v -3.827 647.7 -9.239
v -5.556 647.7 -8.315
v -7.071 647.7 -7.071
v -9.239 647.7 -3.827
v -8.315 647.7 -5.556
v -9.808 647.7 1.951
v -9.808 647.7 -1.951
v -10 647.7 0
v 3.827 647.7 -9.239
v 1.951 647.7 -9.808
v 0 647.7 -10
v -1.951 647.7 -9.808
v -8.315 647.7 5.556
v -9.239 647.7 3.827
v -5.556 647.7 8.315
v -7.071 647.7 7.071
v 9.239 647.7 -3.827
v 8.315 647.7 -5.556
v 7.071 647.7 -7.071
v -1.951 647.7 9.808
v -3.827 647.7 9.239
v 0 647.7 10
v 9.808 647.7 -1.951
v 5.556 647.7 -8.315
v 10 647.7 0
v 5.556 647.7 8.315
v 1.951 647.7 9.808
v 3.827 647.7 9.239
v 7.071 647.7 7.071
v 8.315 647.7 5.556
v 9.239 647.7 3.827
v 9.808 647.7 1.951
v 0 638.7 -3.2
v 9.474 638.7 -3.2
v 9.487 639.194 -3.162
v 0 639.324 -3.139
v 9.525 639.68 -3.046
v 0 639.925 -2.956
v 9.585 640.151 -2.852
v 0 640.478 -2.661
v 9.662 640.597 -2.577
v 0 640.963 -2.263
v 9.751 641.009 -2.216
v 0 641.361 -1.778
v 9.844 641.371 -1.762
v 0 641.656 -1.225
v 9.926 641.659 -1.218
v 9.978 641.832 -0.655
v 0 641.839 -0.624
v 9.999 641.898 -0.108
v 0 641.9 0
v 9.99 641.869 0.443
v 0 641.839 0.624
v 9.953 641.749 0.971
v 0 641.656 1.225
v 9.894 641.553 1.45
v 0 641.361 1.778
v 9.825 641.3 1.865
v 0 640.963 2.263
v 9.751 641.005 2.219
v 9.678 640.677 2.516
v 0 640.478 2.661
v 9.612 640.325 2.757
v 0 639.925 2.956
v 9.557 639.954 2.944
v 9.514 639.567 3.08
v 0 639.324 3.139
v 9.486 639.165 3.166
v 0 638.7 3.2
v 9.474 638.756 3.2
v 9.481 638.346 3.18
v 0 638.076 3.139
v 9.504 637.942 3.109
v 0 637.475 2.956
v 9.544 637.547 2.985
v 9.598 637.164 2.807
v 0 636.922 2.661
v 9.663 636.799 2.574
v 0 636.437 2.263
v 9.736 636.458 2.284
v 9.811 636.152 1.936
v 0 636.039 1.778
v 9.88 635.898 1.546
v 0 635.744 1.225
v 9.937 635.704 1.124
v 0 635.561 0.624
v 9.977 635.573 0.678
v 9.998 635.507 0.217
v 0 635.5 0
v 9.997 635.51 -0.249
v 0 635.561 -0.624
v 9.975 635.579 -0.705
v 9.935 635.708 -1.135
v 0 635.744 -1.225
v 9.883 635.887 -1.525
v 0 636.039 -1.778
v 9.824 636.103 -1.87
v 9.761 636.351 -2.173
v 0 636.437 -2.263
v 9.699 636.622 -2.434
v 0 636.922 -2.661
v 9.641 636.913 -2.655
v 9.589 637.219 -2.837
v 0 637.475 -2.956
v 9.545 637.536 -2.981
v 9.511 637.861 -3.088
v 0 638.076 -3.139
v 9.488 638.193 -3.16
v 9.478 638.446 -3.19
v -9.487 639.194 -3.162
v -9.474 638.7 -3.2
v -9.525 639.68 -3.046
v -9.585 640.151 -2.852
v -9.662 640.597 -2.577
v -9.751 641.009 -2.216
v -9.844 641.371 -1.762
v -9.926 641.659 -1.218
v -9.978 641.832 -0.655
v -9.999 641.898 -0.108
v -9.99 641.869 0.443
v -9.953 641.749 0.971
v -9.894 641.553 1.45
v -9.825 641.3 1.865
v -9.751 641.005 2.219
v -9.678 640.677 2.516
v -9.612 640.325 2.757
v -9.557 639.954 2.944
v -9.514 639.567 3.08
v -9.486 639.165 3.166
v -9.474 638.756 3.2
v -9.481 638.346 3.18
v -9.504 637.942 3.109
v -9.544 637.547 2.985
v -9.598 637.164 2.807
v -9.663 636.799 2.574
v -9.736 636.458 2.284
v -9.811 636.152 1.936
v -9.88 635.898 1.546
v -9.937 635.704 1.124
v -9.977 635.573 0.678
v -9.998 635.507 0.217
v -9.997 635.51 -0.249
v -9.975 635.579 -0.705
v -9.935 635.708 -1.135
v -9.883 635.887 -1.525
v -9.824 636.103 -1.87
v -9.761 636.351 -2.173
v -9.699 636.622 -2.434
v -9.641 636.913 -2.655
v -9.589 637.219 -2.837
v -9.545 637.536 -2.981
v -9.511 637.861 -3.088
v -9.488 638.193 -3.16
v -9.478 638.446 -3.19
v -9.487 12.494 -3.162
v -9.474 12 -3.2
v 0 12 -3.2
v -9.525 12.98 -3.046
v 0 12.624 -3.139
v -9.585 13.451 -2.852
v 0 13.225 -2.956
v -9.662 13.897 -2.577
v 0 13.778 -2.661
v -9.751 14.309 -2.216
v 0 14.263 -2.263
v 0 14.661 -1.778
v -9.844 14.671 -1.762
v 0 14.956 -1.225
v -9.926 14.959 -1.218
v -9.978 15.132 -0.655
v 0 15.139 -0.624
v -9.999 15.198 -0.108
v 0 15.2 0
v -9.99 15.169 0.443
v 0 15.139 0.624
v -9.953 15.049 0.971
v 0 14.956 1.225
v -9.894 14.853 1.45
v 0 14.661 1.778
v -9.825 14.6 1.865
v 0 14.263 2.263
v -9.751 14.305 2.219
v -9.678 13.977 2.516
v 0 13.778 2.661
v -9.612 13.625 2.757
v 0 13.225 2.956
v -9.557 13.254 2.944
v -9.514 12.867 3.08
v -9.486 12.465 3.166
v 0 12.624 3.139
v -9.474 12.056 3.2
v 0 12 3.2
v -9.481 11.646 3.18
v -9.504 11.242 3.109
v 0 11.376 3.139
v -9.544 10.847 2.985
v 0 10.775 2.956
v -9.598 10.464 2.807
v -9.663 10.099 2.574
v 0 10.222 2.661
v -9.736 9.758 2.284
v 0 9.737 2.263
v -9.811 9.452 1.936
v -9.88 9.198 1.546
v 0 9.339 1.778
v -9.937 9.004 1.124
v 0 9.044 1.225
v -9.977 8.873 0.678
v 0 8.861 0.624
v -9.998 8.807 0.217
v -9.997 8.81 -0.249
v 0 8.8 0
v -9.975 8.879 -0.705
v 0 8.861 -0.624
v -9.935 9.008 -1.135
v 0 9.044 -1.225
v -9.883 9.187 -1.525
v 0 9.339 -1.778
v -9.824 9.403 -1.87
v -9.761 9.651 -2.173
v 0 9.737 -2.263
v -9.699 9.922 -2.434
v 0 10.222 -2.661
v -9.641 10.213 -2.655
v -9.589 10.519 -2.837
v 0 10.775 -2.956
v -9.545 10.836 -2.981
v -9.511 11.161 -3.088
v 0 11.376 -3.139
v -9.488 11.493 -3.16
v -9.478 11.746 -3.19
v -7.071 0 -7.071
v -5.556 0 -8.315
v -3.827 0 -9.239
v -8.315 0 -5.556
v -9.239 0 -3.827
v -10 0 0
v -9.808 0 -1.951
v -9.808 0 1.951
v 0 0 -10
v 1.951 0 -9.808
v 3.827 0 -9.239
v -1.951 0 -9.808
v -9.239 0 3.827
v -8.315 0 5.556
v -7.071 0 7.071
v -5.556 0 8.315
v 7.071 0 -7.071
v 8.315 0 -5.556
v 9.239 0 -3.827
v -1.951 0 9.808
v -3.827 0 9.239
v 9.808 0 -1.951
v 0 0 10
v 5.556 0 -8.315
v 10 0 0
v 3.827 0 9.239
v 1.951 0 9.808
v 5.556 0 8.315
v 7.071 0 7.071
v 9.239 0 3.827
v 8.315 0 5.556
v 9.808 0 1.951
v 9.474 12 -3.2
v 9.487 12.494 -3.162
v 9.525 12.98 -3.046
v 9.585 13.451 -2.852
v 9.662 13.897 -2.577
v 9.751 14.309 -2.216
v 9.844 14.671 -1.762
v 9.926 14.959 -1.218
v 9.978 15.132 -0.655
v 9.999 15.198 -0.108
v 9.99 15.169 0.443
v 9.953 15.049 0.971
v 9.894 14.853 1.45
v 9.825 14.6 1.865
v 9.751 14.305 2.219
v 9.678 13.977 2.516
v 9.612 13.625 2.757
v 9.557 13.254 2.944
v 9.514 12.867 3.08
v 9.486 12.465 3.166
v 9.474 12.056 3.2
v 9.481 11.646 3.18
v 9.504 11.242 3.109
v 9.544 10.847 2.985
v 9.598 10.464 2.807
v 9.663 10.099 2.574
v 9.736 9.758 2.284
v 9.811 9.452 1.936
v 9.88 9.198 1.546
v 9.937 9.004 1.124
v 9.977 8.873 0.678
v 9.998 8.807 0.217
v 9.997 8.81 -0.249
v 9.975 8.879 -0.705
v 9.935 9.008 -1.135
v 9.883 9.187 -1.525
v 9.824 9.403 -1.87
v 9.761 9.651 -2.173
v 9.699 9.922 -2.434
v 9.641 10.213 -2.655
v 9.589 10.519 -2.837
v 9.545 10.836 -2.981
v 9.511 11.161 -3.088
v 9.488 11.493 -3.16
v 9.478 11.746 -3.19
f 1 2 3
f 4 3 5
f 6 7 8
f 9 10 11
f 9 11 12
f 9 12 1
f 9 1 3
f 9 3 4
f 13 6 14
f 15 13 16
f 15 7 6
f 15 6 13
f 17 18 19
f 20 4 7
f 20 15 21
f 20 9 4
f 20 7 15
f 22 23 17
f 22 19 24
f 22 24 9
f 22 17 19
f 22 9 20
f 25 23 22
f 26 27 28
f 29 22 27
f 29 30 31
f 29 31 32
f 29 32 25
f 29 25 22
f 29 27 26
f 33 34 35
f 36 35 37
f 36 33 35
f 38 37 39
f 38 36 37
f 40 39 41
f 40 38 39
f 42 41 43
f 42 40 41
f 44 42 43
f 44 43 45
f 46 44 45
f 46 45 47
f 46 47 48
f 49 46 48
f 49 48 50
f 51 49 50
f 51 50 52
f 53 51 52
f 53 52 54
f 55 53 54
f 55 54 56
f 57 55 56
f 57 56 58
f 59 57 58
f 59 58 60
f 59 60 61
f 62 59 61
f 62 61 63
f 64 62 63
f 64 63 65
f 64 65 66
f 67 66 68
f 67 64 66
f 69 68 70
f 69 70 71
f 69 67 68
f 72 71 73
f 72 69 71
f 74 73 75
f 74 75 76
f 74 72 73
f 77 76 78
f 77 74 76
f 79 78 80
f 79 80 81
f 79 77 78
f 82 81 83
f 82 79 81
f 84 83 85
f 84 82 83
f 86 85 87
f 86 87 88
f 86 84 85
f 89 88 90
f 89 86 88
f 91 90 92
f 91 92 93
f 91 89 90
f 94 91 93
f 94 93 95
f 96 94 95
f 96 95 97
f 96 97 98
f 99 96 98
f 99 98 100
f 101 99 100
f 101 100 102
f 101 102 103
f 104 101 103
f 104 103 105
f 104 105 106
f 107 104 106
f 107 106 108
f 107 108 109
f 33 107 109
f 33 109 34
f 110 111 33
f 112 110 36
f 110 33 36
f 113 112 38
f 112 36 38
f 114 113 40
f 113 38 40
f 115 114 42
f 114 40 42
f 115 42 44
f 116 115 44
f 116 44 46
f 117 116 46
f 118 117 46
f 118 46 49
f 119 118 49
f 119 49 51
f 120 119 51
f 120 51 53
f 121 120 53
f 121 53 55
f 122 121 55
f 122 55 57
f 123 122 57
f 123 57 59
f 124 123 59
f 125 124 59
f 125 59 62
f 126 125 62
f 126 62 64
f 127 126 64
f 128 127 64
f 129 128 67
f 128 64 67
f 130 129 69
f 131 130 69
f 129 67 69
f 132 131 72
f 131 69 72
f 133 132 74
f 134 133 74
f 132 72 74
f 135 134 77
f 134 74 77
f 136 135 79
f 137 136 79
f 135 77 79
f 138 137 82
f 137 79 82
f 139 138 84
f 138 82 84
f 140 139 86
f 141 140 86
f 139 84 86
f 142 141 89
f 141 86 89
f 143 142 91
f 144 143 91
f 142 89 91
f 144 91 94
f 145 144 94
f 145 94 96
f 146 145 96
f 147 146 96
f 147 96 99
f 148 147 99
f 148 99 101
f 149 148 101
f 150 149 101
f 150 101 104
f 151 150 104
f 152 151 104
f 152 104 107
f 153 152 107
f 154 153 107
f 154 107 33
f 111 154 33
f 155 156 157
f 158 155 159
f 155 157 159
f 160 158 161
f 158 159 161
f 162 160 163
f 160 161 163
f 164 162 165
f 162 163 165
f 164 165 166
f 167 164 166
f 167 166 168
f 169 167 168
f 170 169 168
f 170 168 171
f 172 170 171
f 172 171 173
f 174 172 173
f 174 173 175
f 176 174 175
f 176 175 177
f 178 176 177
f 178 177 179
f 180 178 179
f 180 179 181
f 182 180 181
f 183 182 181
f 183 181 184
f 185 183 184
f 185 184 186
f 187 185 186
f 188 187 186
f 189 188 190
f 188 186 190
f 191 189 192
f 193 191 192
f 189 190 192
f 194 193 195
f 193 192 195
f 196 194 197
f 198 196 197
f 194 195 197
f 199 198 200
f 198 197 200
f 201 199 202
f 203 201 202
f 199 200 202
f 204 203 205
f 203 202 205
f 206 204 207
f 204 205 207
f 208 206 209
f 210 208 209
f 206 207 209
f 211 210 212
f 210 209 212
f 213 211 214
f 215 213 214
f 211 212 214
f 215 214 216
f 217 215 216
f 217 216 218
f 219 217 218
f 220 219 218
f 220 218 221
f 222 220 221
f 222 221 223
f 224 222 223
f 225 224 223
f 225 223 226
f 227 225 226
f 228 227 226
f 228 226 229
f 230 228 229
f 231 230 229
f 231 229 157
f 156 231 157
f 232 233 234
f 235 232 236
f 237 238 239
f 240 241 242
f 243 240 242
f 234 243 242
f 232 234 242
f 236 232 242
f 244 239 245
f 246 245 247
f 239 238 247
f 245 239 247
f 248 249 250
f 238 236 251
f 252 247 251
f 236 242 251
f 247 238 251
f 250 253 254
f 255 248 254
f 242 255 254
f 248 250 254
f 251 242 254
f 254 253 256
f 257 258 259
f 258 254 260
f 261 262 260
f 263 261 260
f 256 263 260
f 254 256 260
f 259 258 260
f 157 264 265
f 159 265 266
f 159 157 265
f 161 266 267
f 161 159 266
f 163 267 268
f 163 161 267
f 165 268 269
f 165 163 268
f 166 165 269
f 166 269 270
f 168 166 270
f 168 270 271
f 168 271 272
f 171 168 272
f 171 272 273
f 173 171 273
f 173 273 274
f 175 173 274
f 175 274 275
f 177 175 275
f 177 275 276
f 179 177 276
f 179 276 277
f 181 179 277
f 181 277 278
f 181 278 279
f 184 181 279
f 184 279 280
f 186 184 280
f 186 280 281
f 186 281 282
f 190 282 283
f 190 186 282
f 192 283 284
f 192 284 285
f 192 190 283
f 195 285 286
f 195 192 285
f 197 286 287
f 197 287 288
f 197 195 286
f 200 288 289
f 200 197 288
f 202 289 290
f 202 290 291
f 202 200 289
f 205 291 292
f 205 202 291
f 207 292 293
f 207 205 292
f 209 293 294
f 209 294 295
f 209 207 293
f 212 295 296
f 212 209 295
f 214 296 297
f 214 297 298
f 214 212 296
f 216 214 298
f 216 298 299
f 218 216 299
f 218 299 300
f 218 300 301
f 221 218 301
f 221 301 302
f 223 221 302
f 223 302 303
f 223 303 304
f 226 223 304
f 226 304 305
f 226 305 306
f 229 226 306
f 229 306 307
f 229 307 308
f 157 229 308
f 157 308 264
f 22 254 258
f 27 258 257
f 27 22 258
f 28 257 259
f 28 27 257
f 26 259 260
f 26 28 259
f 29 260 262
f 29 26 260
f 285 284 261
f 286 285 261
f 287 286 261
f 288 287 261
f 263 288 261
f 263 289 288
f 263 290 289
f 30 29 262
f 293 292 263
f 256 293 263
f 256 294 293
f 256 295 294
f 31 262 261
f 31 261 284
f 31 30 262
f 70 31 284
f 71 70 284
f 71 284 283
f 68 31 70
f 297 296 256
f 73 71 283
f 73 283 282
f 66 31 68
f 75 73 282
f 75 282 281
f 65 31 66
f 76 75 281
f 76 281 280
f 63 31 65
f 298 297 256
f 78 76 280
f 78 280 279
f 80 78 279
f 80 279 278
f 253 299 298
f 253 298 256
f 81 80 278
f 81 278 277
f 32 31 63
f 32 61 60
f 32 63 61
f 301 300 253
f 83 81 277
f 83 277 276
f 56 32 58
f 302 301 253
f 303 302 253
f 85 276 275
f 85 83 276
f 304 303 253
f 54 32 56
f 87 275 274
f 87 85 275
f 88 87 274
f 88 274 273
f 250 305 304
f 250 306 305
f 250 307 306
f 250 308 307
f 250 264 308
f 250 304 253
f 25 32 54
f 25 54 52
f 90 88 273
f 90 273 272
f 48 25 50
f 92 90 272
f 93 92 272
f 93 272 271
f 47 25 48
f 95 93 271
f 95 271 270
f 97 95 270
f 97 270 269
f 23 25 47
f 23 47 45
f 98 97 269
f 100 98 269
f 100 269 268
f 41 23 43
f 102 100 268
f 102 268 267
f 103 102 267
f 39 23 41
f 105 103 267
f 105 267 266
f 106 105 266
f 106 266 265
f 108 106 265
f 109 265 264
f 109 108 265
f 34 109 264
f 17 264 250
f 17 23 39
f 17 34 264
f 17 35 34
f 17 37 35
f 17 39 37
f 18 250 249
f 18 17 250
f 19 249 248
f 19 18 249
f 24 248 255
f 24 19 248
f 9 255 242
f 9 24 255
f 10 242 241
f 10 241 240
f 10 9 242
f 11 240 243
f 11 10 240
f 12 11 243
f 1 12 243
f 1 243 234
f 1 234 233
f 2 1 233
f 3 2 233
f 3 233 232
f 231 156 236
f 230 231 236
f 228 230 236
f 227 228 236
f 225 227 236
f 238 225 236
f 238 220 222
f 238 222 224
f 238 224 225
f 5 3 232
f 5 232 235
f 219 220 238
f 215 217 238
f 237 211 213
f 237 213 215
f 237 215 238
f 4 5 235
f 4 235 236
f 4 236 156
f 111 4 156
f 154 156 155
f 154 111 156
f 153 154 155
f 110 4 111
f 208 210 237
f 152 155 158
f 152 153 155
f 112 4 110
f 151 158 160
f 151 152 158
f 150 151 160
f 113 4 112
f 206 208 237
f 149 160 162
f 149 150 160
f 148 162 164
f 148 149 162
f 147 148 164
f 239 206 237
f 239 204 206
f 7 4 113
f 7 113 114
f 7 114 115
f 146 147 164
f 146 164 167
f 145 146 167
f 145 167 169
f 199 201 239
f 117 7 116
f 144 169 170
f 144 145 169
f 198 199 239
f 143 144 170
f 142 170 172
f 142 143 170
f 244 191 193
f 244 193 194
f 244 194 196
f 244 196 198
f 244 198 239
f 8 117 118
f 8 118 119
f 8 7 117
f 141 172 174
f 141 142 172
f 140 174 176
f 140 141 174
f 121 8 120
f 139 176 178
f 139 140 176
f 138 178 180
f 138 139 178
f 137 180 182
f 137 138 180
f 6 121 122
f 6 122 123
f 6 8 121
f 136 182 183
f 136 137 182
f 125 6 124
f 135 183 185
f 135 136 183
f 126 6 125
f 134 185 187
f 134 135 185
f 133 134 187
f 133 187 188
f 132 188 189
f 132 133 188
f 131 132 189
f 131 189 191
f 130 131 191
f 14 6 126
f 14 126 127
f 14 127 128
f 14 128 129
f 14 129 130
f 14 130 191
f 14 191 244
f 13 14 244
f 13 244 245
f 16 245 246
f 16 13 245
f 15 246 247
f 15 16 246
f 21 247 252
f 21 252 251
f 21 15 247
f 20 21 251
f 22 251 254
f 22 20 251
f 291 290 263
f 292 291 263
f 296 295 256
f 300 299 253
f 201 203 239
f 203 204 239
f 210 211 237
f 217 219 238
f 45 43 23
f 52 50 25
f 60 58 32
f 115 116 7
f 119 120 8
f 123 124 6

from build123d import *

# Parameters (mm, degrees)
SKETCH1_W               = 10
SKETCH1_H               = 647.7
SKETCH2_R               = 3.2
CUT_EXTRUDE1_DEPTH      = 11
CUT_EXTRUDE1_DEPTH_BACK = 11


with BuildPart() as part:
    # Sketch1 → Revolve2 (revolve)
    with BuildSketch(Plane(origin=(0, 0, 0), x_dir=(0, 0, -1), z_dir=(1, 0, 0))):
        with Locations((-5, 323.85)):
            Rectangle(SKETCH1_W, SKETCH1_H)
    revolve(axis=Axis((0, 0, 0), (0, 1, 0)))

    # Sketch2 → Cut-Extrude1 (cut, two sides)
    with BuildSketch(Plane(origin=(0, 0, 0), x_dir=(0, 0, -1), z_dir=(1, 0, 0))) as cut_extrude1_sk:
        with Locations((0, 638.7)):
            Circle(SKETCH2_R)
        with Locations((0, 12)):
            Circle(SKETCH2_R)
    extrude(amount=CUT_EXTRUDE1_DEPTH, mode=Mode.SUBTRACT)
    extrude(cut_extrude1_sk.sketch, amount=-CUT_EXTRUDE1_DEPTH_BACK, mode=Mode.SUBTRACT)


solid = part.part
